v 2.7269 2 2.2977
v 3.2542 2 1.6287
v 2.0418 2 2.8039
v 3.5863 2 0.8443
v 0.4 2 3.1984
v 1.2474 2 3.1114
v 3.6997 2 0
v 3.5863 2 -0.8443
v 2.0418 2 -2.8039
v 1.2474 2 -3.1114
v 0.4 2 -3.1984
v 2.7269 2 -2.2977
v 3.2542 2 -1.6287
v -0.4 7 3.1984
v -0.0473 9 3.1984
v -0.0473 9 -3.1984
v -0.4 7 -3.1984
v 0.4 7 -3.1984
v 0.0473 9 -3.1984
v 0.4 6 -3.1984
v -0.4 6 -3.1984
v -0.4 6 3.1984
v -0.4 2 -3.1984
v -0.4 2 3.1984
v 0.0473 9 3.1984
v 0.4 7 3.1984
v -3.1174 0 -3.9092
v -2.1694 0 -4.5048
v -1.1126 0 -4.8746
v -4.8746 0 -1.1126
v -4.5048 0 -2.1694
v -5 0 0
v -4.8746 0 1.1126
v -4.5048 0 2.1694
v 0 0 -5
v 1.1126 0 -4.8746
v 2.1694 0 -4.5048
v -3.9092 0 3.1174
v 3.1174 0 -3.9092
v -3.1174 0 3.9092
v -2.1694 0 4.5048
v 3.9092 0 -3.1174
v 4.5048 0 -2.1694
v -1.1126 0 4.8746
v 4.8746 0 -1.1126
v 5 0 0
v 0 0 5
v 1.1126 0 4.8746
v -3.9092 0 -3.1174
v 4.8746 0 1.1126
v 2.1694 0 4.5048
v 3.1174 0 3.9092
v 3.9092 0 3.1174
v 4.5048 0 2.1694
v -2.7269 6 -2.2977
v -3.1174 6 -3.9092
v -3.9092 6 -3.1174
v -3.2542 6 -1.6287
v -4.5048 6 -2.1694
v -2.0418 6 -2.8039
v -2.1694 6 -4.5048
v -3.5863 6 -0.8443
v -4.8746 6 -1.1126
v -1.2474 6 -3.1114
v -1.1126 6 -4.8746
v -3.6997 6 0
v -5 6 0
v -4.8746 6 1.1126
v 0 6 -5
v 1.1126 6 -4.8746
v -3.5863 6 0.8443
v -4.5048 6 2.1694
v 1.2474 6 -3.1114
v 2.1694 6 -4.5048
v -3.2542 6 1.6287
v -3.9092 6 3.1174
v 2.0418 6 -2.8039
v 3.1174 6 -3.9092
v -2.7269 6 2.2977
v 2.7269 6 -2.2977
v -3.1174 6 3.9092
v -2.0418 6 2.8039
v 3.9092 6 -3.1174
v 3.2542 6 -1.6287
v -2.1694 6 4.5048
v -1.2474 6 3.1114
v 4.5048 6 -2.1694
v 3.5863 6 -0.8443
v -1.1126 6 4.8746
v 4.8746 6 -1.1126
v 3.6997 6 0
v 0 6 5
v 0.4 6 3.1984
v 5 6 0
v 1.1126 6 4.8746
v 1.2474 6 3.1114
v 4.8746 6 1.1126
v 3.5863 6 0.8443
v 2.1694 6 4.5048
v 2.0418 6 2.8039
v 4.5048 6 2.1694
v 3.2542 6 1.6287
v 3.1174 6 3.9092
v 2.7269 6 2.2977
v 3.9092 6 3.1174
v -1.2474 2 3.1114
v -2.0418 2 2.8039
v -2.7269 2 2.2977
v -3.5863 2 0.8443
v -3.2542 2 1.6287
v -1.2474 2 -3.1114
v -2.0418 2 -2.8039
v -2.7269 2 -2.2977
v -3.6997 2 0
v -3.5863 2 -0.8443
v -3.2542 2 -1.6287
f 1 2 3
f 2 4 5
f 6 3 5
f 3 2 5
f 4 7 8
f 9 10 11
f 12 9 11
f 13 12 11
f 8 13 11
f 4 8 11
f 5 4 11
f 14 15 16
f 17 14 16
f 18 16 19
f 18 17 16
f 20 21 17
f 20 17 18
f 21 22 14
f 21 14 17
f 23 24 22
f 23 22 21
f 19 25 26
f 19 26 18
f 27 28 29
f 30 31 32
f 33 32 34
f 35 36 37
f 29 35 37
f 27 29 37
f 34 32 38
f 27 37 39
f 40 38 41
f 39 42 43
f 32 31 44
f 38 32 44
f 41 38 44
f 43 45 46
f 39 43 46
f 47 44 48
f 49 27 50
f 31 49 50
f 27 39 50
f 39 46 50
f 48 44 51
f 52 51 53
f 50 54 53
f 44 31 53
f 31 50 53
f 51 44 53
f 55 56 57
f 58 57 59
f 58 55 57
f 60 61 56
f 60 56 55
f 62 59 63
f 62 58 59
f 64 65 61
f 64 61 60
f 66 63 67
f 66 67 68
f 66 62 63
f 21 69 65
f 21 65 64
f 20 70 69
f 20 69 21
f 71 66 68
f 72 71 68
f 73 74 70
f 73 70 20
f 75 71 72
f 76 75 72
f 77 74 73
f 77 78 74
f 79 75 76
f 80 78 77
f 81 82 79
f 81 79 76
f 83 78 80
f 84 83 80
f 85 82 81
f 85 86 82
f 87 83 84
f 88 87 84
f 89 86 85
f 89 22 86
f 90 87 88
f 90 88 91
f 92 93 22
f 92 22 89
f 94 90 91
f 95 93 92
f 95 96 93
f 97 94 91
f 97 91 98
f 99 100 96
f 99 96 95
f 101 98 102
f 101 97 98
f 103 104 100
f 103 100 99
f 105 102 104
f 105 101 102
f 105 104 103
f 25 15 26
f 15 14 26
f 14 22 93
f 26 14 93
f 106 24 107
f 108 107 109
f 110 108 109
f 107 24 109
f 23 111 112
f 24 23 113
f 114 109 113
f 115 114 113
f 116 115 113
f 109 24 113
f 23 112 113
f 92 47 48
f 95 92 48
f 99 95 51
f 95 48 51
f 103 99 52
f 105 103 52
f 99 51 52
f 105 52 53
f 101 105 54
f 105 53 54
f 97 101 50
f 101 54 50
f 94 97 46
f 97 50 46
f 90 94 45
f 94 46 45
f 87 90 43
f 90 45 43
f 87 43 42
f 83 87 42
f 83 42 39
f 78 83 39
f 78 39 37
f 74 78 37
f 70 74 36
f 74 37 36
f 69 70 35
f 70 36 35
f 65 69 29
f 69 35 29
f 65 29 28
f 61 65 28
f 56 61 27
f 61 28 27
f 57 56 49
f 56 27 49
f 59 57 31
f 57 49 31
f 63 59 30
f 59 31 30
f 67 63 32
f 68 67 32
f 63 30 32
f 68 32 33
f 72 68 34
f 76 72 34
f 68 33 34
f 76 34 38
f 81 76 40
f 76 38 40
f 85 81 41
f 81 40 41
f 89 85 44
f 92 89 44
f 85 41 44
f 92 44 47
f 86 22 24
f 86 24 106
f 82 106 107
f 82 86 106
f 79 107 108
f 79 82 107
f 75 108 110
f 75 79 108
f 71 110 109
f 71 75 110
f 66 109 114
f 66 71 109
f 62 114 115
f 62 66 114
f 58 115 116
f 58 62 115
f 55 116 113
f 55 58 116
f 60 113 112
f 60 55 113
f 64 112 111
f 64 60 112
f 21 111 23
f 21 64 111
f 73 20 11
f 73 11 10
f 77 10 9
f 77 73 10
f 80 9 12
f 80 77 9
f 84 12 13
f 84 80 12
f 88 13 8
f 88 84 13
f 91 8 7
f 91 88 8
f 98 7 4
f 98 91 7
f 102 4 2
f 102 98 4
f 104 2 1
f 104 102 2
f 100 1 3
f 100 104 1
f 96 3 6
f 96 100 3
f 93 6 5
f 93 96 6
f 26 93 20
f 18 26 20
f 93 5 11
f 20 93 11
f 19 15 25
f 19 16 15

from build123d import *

# Parameters (mm, degrees)
SKETCH_1_R             = 5
EXTRUDE_1_DEPTH        = 6
CUT_EXTRUDE_1_DEPTH    = 4
SKETCH_3_W             = 0.8
SKETCH_3_H             = 6.396892992
EXTRUDE_2_DEPTH        = 3
CHAMFER_1_SIZE         = 2
CHAMFER_1_SIZE2        = 0.352653961
CHAMFER_1_PART_2_SIZE  = 2
CHAMFER_1_PART_2_SIZE2 = 0.352653961


with BuildPart() as part:
    # Эскиз1 → Бобышка-Вытянуть1 (new body)
    with BuildSketch(Plane(origin=(0, 0, 0), x_dir=(1, 0, 0), z_dir=(0, 1, 0))):
        with Locations(Location((0, 0, 0), (0, 0, 270))):  # turned: the seam where the file's is
            Circle(SKETCH_1_R)
    extrude(amount=EXTRUDE_1_DEPTH)

    # Эскиз2 → Вырез-Вытянуть1 (cut)
    with BuildSketch(Plane(origin=(0, 6, 0), x_dir=(1, 0, 0), z_dir=(0, 1, 0))):
        with BuildLine():
            Line((-0.4, 3.198446496), (-0.4, -3.198446496))
            ThreePointArc((-0.4, -3.198446496), (-3.699699625, 0), (-0.4, 3.198446496))
        make_face()
        with BuildLine():
            Line((0.4, -3.198446496), (0.4, 3.198446496))
            ThreePointArc((0.4, 3.198446496), (3.699699625, 0), (0.4, -3.198446496))
        make_face()
    extrude(amount=-CUT_EXTRUDE_1_DEPTH, mode=Mode.SUBTRACT)

    # Эскиз3 → Бобышка-Вытянуть2 (add)
    with BuildSketch(Plane(origin=(0, 6, 0), x_dir=(1, 0, 0), z_dir=(0, 1, 0))):
        Rectangle(SKETCH_3_W, SKETCH_3_H)
    extrude(amount=EXTRUDE_2_DEPTH)

    # Фаска1
    chamfer_1_edges = [part.edges().sort_by_distance(p)[0] for p in [
        (0.4, 9, 0),
    ]]
    chamfer_1_side = [part.faces().sort_by_distance(p)[0] for p in [
        (0.4, 5.5, 0),
    ]]
    chamfer(chamfer_1_edges, length=CHAMFER_1_SIZE, length2=CHAMFER_1_SIZE2, reference=chamfer_1_side[0])

    # Фаска1 part 2
    chamfer_1_part_2_edges = [part.edges().sort_by_distance(p)[0] for p in [
        (-0.4, 9, 0),
    ]]
    chamfer_1_part_2_side = [part.faces().sort_by_distance(p)[0] for p in [
        (-0.4, 5.5, 0),
    ]]
    chamfer(chamfer_1_part_2_edges, length=CHAMFER_1_PART_2_SIZE, length2=CHAMFER_1_PART_2_SIZE2, reference=chamfer_1_part_2_side[0])


solid = part.part
